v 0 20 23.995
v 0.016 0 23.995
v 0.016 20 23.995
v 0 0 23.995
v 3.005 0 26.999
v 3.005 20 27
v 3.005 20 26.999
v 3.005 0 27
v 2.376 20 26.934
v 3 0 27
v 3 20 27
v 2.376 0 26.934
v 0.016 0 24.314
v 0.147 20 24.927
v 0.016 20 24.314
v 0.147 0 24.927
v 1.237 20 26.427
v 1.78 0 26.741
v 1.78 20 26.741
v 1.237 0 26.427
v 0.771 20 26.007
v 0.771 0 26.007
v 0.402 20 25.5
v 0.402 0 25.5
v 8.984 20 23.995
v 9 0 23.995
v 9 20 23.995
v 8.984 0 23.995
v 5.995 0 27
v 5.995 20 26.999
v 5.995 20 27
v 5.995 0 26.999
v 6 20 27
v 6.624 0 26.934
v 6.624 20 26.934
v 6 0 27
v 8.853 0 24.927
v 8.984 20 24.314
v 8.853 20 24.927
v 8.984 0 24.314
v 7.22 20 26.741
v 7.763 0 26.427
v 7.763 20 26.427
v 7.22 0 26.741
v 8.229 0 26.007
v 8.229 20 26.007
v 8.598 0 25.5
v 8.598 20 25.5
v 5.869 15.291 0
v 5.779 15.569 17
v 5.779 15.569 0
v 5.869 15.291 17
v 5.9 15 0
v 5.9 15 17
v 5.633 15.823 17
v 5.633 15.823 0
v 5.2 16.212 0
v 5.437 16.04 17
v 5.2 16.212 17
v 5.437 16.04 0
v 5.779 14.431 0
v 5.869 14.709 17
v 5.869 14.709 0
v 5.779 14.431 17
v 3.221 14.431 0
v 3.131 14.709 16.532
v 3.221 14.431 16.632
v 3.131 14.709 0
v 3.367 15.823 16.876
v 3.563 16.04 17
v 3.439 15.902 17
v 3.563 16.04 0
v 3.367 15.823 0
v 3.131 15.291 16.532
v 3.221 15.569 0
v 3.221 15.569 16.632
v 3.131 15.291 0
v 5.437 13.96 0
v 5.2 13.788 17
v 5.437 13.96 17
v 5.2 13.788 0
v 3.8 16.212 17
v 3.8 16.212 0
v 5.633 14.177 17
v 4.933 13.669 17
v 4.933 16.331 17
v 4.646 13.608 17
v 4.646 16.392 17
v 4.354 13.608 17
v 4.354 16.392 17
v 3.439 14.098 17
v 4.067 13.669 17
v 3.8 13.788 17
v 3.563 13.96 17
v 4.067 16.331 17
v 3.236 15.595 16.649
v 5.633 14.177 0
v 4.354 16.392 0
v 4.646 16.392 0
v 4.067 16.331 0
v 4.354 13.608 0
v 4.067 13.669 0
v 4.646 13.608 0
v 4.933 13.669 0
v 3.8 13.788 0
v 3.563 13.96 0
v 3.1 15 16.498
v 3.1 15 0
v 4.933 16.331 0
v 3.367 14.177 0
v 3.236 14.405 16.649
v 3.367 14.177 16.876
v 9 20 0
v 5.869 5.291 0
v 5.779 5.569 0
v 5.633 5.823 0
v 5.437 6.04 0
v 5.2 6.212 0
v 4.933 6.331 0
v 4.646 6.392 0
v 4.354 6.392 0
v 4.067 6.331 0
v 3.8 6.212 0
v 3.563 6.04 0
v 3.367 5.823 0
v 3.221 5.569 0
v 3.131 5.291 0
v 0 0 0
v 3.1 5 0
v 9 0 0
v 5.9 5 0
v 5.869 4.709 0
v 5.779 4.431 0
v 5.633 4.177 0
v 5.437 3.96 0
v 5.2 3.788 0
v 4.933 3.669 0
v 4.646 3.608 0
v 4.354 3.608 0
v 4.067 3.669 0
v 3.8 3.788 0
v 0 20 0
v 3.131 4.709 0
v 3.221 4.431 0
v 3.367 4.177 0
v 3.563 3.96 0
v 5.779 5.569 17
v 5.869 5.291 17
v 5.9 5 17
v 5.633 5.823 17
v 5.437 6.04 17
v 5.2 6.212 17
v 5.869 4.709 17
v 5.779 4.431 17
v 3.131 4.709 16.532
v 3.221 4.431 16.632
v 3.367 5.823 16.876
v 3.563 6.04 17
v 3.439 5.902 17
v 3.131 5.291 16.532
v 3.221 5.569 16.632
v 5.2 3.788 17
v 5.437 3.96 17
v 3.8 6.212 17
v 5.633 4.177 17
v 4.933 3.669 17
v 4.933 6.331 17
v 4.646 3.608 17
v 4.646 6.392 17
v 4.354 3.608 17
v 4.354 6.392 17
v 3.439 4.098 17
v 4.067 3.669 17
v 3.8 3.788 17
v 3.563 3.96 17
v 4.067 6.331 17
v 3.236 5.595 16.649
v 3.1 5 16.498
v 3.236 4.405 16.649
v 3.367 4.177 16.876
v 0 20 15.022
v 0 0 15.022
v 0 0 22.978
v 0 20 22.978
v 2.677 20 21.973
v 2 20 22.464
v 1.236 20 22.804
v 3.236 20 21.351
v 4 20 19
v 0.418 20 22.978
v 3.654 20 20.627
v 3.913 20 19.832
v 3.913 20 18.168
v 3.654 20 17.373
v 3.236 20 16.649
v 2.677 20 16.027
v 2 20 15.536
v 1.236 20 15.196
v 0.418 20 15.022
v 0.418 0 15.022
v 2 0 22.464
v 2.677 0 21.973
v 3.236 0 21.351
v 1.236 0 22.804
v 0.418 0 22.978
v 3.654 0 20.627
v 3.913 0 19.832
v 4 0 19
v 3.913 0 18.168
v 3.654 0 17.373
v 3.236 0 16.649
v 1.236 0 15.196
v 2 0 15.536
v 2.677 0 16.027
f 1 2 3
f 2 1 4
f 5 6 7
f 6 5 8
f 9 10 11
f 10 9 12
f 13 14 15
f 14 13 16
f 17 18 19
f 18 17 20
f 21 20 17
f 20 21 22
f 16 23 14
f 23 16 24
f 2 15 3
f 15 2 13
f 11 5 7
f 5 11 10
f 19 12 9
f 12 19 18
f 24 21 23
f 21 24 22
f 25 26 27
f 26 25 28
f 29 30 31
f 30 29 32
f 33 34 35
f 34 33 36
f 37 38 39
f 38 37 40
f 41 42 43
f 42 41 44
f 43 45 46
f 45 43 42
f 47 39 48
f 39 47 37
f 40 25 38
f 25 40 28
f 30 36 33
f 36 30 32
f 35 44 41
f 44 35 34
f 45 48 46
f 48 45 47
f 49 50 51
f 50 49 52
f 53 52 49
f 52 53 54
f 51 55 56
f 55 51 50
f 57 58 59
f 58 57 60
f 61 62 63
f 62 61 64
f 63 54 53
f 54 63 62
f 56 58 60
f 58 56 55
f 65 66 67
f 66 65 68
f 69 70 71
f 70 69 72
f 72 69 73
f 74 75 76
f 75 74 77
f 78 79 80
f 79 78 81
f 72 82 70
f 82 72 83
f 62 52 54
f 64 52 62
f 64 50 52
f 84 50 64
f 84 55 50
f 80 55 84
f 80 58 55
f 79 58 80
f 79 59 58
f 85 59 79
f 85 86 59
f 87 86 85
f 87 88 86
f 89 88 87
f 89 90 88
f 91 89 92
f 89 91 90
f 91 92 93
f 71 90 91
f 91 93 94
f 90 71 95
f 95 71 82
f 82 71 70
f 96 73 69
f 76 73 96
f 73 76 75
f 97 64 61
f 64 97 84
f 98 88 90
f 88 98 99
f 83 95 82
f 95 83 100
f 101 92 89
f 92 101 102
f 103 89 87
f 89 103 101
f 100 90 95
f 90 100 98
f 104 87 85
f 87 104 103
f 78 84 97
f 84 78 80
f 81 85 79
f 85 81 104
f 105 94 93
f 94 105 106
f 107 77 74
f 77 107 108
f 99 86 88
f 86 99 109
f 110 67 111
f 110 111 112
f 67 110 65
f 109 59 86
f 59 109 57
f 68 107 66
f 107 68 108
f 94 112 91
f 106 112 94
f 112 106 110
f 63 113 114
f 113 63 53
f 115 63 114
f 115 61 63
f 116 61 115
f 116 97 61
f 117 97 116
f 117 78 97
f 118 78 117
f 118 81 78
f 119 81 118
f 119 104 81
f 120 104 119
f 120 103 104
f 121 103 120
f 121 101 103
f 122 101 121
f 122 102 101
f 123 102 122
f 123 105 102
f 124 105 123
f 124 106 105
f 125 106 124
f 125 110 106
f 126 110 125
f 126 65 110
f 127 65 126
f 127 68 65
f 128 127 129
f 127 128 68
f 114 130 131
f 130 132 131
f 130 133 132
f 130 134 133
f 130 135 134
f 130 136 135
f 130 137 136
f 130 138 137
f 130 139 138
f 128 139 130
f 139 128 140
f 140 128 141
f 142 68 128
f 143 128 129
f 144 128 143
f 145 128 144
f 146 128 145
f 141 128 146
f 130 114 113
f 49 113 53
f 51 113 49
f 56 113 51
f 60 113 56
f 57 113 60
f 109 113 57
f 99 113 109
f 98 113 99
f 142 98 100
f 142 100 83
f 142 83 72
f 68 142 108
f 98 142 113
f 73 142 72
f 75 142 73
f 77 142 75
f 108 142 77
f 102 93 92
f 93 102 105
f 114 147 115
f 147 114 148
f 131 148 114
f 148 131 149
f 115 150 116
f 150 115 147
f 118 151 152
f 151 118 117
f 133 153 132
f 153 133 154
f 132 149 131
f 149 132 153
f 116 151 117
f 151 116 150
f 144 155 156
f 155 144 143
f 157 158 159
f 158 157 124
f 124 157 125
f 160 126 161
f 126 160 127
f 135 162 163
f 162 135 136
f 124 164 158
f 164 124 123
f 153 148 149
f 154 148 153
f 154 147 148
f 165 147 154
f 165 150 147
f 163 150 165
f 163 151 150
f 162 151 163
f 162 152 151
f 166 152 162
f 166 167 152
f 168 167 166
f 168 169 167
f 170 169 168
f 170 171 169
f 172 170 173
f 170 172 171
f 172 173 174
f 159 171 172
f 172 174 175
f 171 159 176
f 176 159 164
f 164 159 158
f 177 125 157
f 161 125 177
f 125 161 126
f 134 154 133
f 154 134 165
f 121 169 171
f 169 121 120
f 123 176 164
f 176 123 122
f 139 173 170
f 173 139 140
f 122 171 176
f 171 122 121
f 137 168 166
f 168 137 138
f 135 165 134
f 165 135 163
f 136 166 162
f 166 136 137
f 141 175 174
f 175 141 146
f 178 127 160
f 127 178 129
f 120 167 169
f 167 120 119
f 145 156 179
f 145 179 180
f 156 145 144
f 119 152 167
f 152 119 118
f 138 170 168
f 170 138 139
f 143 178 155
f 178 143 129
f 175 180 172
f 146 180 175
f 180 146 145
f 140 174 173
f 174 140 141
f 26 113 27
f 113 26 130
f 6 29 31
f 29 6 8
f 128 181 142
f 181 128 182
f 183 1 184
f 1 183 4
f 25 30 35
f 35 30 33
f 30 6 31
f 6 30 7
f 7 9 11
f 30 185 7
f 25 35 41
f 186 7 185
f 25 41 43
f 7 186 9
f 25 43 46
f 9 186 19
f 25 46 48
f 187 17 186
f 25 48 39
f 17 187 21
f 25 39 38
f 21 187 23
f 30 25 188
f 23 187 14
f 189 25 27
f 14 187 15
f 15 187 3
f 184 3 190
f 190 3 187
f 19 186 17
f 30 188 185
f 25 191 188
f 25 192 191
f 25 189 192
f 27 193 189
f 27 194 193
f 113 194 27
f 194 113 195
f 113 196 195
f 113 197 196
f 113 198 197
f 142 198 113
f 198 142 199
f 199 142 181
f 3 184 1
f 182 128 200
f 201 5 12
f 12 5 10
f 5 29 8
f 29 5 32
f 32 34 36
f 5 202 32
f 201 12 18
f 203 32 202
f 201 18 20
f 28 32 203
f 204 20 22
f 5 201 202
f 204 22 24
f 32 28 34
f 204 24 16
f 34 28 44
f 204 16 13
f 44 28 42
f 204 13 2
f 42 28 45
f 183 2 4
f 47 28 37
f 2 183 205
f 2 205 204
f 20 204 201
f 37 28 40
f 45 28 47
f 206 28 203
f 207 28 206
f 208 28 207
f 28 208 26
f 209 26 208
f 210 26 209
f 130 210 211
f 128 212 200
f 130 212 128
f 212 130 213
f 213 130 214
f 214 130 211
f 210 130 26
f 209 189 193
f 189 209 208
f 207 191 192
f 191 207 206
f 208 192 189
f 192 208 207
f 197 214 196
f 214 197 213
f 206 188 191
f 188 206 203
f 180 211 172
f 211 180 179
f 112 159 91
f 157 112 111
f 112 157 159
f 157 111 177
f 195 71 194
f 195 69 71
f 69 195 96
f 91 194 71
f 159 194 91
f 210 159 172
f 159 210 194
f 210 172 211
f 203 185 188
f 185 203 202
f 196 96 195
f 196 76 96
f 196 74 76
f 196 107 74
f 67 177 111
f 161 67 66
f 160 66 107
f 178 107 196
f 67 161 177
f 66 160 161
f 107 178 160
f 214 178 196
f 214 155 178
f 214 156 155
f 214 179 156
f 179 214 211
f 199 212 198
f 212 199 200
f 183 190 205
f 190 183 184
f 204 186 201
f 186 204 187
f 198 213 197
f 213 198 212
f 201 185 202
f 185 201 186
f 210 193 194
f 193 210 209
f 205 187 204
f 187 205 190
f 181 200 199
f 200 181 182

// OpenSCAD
$fn = 30;


module fillet(r, h) {
  translate([r / 2, r / 2, 0])
    difference() {
      cube([r + 0.01, r + 0.01, h], center = true);
      translate([r/2, r/2, 0])
        cylinder(r = r, h = h + 1, center = true);
  }
}


module lg_cam_attach() {
  
  difference() {
    cube([9,20,27]);
    translate([0, 10, 27])
      rotate([90, 90, 0])
        fillet(r=3, h=22);
    translate([9, 10, 27])
      rotate([90, 90, 180])
        fillet(r=3, h=22);
    translate([0, 21, 19]) {
      rotate([90, 0, 0]) {
        cylinder(r=4, h=22);
      }
    }
    translate([4.5, 15, 0]) {
      cylinder(d=2.8, h=17);
      translate([0, -10, 0]) {
        cylinder(d=2.8, h=17);
      }
    }
  }

}

lg_cam_attach();
